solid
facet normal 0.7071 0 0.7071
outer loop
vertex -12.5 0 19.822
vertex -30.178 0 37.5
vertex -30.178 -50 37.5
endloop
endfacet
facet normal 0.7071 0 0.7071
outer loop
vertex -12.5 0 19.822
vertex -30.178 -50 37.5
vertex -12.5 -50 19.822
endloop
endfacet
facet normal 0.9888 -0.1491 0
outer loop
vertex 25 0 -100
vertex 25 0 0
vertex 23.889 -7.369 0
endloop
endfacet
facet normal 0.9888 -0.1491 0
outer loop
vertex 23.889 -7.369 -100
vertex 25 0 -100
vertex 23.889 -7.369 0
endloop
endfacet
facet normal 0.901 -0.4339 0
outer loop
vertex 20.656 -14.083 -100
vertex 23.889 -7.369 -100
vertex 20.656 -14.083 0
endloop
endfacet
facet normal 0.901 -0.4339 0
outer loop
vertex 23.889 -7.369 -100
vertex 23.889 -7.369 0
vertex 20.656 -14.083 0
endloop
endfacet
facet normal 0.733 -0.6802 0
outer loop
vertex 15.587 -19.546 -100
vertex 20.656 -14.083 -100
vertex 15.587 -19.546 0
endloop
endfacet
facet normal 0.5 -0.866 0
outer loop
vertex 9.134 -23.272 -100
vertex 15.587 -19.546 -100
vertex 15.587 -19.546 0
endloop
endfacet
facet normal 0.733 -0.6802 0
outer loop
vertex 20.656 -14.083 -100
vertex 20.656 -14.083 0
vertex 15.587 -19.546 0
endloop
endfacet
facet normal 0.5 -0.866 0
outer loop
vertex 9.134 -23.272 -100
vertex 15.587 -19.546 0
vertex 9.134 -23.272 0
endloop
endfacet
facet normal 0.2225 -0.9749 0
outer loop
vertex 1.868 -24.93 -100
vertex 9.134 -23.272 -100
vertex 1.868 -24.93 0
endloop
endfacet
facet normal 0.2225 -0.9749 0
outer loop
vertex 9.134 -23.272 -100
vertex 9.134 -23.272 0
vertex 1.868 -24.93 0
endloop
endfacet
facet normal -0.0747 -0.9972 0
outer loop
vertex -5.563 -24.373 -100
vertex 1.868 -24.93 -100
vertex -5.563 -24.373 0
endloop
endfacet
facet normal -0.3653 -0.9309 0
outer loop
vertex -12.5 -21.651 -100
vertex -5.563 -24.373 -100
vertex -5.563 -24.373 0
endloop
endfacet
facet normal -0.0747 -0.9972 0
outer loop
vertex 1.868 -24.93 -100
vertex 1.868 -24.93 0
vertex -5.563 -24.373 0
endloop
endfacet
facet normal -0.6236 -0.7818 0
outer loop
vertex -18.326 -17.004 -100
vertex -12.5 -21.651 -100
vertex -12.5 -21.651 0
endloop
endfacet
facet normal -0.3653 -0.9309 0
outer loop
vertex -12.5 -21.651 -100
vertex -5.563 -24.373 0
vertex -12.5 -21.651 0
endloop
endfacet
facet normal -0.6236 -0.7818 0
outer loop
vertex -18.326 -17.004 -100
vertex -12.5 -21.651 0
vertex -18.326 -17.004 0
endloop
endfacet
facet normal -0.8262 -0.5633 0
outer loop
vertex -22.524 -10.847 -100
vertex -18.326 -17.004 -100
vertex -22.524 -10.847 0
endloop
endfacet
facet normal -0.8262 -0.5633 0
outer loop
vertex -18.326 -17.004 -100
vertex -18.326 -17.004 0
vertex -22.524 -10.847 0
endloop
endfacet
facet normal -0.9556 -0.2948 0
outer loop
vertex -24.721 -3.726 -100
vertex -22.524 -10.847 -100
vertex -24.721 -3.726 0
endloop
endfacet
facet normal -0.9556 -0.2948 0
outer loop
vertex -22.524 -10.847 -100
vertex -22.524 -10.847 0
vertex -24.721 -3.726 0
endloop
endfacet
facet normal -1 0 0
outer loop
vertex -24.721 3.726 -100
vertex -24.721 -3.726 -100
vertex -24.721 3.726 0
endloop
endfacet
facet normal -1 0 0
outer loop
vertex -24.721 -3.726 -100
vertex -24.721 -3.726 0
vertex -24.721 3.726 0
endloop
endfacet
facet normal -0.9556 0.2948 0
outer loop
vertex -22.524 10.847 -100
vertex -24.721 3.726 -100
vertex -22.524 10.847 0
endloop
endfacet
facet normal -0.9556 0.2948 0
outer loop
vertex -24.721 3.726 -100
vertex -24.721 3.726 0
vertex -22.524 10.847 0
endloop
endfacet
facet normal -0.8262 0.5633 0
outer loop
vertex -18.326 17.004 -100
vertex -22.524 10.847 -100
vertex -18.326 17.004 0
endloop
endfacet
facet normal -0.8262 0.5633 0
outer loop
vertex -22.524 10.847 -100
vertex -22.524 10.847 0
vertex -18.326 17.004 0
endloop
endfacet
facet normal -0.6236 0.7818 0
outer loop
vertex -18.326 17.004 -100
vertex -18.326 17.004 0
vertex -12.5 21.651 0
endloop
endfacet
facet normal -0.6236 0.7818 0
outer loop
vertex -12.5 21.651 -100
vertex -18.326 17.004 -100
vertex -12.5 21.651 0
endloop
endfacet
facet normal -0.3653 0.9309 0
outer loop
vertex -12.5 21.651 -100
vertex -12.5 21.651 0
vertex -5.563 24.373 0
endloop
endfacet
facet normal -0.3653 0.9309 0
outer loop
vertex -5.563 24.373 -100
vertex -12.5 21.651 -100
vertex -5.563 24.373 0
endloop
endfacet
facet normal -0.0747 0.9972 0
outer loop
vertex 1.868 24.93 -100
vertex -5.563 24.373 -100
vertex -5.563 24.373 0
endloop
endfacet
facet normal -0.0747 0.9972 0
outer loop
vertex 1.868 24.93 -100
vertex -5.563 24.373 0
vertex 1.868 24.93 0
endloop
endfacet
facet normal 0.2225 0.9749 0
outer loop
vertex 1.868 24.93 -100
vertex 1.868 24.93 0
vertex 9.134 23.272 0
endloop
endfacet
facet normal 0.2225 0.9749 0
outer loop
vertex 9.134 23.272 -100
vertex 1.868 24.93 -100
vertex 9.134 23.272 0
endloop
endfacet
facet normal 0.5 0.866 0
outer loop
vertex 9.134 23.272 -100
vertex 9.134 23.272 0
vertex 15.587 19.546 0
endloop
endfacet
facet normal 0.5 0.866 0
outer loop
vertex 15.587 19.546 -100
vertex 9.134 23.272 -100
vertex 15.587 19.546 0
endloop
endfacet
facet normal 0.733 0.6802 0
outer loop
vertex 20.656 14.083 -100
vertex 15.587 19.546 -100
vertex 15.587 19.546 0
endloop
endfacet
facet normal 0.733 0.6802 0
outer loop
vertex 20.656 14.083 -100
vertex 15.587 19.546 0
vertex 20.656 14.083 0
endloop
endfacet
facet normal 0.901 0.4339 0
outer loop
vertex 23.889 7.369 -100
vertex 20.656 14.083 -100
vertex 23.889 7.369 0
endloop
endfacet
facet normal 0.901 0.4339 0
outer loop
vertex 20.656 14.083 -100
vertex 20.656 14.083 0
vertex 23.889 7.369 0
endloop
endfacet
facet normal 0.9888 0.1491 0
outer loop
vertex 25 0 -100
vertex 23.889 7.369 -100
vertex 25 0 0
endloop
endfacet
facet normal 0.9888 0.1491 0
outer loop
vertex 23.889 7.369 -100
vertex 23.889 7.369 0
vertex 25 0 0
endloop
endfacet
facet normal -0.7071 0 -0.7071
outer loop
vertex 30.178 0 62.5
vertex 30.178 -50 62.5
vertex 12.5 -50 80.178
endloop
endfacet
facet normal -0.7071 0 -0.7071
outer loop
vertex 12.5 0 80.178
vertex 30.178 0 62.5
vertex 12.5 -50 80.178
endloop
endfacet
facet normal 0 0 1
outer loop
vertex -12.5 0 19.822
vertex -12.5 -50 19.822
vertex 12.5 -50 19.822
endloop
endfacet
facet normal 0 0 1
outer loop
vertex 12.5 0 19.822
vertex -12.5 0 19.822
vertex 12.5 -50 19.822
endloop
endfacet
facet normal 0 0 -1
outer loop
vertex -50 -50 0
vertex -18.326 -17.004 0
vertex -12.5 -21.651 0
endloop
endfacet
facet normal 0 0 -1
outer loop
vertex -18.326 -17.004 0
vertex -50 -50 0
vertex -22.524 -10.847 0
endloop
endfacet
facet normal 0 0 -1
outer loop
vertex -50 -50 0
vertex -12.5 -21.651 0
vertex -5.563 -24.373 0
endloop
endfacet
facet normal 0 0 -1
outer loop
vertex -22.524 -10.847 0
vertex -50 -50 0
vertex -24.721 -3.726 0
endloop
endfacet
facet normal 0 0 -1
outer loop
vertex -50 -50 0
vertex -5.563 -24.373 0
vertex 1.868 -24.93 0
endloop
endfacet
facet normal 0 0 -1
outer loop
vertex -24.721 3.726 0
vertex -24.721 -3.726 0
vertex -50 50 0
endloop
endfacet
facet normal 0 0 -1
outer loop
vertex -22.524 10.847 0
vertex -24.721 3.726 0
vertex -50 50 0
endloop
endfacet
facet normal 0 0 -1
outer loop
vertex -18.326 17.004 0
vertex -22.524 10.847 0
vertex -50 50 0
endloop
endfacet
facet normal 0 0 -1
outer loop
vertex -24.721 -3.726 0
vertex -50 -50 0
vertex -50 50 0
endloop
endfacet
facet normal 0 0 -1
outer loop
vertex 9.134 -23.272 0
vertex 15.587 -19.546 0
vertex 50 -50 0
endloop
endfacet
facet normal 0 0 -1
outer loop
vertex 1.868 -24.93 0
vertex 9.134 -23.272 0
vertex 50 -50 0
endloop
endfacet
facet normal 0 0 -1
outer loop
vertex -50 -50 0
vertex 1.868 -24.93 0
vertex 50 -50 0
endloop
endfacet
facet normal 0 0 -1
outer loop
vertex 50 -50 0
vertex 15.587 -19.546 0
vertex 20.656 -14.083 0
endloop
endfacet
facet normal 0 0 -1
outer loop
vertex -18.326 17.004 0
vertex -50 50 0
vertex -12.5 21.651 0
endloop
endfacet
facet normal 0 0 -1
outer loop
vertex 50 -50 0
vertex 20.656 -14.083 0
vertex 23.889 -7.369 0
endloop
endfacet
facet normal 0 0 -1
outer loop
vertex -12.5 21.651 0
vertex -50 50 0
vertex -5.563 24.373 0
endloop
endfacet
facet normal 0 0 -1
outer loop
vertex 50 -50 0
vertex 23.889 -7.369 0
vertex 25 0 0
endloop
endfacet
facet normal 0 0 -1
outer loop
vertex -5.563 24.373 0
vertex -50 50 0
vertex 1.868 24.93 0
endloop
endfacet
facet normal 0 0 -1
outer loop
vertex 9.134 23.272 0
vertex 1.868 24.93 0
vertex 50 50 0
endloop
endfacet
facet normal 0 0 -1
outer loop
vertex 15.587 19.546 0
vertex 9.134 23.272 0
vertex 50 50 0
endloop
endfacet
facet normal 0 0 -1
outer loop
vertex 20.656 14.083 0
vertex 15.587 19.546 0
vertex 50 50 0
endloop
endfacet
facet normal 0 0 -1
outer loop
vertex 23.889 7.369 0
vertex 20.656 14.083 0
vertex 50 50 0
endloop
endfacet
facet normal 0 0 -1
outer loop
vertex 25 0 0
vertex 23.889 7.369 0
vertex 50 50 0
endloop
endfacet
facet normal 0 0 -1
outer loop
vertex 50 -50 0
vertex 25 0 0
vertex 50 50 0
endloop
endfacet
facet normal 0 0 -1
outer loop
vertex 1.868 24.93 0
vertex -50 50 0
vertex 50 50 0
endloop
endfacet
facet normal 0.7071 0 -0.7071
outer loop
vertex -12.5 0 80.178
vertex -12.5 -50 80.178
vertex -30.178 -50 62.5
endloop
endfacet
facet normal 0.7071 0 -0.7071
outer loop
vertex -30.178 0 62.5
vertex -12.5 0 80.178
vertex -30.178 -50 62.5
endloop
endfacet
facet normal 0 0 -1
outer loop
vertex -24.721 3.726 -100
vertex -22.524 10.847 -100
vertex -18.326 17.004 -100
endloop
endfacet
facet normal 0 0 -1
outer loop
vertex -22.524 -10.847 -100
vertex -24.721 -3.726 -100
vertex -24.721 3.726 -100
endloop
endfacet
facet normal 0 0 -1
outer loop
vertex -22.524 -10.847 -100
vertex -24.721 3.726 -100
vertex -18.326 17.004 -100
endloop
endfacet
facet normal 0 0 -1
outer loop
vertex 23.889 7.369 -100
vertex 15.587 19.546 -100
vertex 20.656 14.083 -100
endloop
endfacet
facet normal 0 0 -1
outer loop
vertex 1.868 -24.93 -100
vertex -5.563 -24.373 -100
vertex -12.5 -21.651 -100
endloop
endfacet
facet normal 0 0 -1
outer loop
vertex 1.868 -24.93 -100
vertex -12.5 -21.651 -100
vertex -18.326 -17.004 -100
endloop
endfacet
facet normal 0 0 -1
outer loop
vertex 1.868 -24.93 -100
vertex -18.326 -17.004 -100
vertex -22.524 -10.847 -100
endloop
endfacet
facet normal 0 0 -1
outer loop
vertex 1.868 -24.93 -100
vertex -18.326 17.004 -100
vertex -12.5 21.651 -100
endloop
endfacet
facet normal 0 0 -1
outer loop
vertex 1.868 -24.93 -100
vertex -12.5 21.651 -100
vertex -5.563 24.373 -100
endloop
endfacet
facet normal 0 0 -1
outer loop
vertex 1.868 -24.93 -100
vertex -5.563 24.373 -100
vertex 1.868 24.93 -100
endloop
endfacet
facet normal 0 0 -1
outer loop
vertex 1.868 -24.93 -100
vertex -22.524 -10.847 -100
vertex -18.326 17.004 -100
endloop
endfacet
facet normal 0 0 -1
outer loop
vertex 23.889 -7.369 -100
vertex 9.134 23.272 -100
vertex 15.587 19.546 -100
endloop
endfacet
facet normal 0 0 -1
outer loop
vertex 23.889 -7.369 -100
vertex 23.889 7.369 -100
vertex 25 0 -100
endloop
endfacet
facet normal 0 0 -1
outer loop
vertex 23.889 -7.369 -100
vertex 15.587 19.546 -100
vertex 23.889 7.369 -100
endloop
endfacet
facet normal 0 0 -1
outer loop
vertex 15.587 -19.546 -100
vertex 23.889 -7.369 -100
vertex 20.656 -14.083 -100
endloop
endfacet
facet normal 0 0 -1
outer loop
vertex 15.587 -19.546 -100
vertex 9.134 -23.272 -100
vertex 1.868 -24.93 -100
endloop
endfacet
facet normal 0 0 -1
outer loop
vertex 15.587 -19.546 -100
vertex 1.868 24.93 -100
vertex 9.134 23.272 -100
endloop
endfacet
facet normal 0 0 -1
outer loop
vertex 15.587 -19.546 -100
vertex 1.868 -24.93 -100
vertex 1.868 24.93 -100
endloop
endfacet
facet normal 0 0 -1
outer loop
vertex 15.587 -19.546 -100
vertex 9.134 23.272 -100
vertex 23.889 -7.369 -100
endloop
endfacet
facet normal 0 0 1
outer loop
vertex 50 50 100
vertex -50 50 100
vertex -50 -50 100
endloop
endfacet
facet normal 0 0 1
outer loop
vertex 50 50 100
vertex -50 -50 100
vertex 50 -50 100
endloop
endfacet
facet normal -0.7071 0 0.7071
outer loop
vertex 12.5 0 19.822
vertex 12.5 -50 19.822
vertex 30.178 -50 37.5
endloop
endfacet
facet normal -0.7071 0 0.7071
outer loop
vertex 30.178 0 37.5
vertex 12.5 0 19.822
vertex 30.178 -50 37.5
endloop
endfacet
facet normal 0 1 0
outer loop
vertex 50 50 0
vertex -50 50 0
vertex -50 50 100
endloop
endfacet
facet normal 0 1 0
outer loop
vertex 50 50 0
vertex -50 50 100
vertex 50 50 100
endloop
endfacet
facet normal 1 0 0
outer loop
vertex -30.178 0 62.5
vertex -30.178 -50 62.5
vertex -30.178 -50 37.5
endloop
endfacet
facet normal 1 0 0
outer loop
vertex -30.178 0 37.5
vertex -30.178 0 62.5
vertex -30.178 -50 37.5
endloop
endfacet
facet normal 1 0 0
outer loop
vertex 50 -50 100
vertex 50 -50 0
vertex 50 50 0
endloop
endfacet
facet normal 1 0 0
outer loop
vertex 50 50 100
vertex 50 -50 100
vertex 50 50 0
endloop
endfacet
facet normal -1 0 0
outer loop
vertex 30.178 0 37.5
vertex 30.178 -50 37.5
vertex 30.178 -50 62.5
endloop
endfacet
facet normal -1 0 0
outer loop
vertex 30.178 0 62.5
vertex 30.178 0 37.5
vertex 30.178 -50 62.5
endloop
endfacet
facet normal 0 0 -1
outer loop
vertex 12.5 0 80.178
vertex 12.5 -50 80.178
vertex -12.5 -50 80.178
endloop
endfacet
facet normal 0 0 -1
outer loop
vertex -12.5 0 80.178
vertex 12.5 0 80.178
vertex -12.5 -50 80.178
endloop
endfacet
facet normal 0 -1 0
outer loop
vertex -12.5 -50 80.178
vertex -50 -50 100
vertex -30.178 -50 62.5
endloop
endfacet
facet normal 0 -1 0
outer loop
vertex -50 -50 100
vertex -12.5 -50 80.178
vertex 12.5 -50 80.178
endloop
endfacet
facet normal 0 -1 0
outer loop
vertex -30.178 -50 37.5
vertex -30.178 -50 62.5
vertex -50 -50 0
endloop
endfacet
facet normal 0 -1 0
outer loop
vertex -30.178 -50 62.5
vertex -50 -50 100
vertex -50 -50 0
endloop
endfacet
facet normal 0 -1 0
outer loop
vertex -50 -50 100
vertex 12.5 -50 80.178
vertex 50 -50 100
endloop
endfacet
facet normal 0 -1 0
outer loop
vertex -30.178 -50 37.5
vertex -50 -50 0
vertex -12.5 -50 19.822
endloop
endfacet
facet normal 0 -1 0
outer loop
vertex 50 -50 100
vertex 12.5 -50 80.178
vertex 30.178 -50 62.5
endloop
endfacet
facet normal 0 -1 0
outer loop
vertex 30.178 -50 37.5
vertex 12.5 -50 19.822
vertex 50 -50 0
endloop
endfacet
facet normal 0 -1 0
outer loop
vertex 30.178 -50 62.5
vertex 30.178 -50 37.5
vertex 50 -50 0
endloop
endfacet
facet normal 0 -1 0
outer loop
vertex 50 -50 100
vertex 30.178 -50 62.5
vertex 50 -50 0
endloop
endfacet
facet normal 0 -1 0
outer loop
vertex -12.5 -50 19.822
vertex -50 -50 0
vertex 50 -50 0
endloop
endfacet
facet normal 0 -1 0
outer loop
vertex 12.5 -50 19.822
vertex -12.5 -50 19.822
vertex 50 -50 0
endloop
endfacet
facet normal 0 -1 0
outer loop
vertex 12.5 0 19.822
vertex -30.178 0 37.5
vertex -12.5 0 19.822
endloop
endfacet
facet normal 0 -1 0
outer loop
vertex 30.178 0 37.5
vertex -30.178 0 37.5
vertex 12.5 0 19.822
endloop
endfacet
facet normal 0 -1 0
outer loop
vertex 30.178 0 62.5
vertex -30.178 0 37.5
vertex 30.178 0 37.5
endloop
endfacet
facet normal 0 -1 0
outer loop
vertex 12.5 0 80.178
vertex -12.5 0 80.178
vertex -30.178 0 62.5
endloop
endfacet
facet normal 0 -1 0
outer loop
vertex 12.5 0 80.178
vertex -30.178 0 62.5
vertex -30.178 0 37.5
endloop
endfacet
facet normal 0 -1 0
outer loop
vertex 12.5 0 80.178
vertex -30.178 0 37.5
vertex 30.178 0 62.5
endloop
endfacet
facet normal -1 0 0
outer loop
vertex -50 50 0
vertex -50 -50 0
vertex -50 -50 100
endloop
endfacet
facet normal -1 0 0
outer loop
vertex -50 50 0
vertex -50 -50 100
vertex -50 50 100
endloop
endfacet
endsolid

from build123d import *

# Parameters (mm, degrees)
F0_W     = 100
F0_H     = 100
F1_DEPTH = 100
F2_R     = 25
F3_DEPTH = 100
F5_DEPTH = 50


with BuildPart() as f1:
    # F0 (on Top) → F1 (new body)
    with BuildSketch(Plane.XY):
        Rectangle(F0_W, F0_H)
    extrude(amount=F1_DEPTH)

    # F2 (on face) → F3 (join)
    with BuildSketch(Plane(origin=(0, 0, 0), x_dir=(1, 0, 0), z_dir=(0, 0, -1))):
        Circle(F2_R)
    extrude(amount=F3_DEPTH)

    # F4 (on face) → F5 (cut)
    with BuildSketch(Plane.XZ.offset(50)):
        Polygon((12.5, 80.17767), (-12.5, 80.17767), (-30.17767, 62.5), (-30.17767, 37.5), (-12.5, 19.82233), (12.5, 19.82233), (30.17767, 37.5), (30.17767, 62.5), align=None)
    extrude(amount=-F5_DEPTH, mode=Mode.SUBTRACT)


solid = f1.part
